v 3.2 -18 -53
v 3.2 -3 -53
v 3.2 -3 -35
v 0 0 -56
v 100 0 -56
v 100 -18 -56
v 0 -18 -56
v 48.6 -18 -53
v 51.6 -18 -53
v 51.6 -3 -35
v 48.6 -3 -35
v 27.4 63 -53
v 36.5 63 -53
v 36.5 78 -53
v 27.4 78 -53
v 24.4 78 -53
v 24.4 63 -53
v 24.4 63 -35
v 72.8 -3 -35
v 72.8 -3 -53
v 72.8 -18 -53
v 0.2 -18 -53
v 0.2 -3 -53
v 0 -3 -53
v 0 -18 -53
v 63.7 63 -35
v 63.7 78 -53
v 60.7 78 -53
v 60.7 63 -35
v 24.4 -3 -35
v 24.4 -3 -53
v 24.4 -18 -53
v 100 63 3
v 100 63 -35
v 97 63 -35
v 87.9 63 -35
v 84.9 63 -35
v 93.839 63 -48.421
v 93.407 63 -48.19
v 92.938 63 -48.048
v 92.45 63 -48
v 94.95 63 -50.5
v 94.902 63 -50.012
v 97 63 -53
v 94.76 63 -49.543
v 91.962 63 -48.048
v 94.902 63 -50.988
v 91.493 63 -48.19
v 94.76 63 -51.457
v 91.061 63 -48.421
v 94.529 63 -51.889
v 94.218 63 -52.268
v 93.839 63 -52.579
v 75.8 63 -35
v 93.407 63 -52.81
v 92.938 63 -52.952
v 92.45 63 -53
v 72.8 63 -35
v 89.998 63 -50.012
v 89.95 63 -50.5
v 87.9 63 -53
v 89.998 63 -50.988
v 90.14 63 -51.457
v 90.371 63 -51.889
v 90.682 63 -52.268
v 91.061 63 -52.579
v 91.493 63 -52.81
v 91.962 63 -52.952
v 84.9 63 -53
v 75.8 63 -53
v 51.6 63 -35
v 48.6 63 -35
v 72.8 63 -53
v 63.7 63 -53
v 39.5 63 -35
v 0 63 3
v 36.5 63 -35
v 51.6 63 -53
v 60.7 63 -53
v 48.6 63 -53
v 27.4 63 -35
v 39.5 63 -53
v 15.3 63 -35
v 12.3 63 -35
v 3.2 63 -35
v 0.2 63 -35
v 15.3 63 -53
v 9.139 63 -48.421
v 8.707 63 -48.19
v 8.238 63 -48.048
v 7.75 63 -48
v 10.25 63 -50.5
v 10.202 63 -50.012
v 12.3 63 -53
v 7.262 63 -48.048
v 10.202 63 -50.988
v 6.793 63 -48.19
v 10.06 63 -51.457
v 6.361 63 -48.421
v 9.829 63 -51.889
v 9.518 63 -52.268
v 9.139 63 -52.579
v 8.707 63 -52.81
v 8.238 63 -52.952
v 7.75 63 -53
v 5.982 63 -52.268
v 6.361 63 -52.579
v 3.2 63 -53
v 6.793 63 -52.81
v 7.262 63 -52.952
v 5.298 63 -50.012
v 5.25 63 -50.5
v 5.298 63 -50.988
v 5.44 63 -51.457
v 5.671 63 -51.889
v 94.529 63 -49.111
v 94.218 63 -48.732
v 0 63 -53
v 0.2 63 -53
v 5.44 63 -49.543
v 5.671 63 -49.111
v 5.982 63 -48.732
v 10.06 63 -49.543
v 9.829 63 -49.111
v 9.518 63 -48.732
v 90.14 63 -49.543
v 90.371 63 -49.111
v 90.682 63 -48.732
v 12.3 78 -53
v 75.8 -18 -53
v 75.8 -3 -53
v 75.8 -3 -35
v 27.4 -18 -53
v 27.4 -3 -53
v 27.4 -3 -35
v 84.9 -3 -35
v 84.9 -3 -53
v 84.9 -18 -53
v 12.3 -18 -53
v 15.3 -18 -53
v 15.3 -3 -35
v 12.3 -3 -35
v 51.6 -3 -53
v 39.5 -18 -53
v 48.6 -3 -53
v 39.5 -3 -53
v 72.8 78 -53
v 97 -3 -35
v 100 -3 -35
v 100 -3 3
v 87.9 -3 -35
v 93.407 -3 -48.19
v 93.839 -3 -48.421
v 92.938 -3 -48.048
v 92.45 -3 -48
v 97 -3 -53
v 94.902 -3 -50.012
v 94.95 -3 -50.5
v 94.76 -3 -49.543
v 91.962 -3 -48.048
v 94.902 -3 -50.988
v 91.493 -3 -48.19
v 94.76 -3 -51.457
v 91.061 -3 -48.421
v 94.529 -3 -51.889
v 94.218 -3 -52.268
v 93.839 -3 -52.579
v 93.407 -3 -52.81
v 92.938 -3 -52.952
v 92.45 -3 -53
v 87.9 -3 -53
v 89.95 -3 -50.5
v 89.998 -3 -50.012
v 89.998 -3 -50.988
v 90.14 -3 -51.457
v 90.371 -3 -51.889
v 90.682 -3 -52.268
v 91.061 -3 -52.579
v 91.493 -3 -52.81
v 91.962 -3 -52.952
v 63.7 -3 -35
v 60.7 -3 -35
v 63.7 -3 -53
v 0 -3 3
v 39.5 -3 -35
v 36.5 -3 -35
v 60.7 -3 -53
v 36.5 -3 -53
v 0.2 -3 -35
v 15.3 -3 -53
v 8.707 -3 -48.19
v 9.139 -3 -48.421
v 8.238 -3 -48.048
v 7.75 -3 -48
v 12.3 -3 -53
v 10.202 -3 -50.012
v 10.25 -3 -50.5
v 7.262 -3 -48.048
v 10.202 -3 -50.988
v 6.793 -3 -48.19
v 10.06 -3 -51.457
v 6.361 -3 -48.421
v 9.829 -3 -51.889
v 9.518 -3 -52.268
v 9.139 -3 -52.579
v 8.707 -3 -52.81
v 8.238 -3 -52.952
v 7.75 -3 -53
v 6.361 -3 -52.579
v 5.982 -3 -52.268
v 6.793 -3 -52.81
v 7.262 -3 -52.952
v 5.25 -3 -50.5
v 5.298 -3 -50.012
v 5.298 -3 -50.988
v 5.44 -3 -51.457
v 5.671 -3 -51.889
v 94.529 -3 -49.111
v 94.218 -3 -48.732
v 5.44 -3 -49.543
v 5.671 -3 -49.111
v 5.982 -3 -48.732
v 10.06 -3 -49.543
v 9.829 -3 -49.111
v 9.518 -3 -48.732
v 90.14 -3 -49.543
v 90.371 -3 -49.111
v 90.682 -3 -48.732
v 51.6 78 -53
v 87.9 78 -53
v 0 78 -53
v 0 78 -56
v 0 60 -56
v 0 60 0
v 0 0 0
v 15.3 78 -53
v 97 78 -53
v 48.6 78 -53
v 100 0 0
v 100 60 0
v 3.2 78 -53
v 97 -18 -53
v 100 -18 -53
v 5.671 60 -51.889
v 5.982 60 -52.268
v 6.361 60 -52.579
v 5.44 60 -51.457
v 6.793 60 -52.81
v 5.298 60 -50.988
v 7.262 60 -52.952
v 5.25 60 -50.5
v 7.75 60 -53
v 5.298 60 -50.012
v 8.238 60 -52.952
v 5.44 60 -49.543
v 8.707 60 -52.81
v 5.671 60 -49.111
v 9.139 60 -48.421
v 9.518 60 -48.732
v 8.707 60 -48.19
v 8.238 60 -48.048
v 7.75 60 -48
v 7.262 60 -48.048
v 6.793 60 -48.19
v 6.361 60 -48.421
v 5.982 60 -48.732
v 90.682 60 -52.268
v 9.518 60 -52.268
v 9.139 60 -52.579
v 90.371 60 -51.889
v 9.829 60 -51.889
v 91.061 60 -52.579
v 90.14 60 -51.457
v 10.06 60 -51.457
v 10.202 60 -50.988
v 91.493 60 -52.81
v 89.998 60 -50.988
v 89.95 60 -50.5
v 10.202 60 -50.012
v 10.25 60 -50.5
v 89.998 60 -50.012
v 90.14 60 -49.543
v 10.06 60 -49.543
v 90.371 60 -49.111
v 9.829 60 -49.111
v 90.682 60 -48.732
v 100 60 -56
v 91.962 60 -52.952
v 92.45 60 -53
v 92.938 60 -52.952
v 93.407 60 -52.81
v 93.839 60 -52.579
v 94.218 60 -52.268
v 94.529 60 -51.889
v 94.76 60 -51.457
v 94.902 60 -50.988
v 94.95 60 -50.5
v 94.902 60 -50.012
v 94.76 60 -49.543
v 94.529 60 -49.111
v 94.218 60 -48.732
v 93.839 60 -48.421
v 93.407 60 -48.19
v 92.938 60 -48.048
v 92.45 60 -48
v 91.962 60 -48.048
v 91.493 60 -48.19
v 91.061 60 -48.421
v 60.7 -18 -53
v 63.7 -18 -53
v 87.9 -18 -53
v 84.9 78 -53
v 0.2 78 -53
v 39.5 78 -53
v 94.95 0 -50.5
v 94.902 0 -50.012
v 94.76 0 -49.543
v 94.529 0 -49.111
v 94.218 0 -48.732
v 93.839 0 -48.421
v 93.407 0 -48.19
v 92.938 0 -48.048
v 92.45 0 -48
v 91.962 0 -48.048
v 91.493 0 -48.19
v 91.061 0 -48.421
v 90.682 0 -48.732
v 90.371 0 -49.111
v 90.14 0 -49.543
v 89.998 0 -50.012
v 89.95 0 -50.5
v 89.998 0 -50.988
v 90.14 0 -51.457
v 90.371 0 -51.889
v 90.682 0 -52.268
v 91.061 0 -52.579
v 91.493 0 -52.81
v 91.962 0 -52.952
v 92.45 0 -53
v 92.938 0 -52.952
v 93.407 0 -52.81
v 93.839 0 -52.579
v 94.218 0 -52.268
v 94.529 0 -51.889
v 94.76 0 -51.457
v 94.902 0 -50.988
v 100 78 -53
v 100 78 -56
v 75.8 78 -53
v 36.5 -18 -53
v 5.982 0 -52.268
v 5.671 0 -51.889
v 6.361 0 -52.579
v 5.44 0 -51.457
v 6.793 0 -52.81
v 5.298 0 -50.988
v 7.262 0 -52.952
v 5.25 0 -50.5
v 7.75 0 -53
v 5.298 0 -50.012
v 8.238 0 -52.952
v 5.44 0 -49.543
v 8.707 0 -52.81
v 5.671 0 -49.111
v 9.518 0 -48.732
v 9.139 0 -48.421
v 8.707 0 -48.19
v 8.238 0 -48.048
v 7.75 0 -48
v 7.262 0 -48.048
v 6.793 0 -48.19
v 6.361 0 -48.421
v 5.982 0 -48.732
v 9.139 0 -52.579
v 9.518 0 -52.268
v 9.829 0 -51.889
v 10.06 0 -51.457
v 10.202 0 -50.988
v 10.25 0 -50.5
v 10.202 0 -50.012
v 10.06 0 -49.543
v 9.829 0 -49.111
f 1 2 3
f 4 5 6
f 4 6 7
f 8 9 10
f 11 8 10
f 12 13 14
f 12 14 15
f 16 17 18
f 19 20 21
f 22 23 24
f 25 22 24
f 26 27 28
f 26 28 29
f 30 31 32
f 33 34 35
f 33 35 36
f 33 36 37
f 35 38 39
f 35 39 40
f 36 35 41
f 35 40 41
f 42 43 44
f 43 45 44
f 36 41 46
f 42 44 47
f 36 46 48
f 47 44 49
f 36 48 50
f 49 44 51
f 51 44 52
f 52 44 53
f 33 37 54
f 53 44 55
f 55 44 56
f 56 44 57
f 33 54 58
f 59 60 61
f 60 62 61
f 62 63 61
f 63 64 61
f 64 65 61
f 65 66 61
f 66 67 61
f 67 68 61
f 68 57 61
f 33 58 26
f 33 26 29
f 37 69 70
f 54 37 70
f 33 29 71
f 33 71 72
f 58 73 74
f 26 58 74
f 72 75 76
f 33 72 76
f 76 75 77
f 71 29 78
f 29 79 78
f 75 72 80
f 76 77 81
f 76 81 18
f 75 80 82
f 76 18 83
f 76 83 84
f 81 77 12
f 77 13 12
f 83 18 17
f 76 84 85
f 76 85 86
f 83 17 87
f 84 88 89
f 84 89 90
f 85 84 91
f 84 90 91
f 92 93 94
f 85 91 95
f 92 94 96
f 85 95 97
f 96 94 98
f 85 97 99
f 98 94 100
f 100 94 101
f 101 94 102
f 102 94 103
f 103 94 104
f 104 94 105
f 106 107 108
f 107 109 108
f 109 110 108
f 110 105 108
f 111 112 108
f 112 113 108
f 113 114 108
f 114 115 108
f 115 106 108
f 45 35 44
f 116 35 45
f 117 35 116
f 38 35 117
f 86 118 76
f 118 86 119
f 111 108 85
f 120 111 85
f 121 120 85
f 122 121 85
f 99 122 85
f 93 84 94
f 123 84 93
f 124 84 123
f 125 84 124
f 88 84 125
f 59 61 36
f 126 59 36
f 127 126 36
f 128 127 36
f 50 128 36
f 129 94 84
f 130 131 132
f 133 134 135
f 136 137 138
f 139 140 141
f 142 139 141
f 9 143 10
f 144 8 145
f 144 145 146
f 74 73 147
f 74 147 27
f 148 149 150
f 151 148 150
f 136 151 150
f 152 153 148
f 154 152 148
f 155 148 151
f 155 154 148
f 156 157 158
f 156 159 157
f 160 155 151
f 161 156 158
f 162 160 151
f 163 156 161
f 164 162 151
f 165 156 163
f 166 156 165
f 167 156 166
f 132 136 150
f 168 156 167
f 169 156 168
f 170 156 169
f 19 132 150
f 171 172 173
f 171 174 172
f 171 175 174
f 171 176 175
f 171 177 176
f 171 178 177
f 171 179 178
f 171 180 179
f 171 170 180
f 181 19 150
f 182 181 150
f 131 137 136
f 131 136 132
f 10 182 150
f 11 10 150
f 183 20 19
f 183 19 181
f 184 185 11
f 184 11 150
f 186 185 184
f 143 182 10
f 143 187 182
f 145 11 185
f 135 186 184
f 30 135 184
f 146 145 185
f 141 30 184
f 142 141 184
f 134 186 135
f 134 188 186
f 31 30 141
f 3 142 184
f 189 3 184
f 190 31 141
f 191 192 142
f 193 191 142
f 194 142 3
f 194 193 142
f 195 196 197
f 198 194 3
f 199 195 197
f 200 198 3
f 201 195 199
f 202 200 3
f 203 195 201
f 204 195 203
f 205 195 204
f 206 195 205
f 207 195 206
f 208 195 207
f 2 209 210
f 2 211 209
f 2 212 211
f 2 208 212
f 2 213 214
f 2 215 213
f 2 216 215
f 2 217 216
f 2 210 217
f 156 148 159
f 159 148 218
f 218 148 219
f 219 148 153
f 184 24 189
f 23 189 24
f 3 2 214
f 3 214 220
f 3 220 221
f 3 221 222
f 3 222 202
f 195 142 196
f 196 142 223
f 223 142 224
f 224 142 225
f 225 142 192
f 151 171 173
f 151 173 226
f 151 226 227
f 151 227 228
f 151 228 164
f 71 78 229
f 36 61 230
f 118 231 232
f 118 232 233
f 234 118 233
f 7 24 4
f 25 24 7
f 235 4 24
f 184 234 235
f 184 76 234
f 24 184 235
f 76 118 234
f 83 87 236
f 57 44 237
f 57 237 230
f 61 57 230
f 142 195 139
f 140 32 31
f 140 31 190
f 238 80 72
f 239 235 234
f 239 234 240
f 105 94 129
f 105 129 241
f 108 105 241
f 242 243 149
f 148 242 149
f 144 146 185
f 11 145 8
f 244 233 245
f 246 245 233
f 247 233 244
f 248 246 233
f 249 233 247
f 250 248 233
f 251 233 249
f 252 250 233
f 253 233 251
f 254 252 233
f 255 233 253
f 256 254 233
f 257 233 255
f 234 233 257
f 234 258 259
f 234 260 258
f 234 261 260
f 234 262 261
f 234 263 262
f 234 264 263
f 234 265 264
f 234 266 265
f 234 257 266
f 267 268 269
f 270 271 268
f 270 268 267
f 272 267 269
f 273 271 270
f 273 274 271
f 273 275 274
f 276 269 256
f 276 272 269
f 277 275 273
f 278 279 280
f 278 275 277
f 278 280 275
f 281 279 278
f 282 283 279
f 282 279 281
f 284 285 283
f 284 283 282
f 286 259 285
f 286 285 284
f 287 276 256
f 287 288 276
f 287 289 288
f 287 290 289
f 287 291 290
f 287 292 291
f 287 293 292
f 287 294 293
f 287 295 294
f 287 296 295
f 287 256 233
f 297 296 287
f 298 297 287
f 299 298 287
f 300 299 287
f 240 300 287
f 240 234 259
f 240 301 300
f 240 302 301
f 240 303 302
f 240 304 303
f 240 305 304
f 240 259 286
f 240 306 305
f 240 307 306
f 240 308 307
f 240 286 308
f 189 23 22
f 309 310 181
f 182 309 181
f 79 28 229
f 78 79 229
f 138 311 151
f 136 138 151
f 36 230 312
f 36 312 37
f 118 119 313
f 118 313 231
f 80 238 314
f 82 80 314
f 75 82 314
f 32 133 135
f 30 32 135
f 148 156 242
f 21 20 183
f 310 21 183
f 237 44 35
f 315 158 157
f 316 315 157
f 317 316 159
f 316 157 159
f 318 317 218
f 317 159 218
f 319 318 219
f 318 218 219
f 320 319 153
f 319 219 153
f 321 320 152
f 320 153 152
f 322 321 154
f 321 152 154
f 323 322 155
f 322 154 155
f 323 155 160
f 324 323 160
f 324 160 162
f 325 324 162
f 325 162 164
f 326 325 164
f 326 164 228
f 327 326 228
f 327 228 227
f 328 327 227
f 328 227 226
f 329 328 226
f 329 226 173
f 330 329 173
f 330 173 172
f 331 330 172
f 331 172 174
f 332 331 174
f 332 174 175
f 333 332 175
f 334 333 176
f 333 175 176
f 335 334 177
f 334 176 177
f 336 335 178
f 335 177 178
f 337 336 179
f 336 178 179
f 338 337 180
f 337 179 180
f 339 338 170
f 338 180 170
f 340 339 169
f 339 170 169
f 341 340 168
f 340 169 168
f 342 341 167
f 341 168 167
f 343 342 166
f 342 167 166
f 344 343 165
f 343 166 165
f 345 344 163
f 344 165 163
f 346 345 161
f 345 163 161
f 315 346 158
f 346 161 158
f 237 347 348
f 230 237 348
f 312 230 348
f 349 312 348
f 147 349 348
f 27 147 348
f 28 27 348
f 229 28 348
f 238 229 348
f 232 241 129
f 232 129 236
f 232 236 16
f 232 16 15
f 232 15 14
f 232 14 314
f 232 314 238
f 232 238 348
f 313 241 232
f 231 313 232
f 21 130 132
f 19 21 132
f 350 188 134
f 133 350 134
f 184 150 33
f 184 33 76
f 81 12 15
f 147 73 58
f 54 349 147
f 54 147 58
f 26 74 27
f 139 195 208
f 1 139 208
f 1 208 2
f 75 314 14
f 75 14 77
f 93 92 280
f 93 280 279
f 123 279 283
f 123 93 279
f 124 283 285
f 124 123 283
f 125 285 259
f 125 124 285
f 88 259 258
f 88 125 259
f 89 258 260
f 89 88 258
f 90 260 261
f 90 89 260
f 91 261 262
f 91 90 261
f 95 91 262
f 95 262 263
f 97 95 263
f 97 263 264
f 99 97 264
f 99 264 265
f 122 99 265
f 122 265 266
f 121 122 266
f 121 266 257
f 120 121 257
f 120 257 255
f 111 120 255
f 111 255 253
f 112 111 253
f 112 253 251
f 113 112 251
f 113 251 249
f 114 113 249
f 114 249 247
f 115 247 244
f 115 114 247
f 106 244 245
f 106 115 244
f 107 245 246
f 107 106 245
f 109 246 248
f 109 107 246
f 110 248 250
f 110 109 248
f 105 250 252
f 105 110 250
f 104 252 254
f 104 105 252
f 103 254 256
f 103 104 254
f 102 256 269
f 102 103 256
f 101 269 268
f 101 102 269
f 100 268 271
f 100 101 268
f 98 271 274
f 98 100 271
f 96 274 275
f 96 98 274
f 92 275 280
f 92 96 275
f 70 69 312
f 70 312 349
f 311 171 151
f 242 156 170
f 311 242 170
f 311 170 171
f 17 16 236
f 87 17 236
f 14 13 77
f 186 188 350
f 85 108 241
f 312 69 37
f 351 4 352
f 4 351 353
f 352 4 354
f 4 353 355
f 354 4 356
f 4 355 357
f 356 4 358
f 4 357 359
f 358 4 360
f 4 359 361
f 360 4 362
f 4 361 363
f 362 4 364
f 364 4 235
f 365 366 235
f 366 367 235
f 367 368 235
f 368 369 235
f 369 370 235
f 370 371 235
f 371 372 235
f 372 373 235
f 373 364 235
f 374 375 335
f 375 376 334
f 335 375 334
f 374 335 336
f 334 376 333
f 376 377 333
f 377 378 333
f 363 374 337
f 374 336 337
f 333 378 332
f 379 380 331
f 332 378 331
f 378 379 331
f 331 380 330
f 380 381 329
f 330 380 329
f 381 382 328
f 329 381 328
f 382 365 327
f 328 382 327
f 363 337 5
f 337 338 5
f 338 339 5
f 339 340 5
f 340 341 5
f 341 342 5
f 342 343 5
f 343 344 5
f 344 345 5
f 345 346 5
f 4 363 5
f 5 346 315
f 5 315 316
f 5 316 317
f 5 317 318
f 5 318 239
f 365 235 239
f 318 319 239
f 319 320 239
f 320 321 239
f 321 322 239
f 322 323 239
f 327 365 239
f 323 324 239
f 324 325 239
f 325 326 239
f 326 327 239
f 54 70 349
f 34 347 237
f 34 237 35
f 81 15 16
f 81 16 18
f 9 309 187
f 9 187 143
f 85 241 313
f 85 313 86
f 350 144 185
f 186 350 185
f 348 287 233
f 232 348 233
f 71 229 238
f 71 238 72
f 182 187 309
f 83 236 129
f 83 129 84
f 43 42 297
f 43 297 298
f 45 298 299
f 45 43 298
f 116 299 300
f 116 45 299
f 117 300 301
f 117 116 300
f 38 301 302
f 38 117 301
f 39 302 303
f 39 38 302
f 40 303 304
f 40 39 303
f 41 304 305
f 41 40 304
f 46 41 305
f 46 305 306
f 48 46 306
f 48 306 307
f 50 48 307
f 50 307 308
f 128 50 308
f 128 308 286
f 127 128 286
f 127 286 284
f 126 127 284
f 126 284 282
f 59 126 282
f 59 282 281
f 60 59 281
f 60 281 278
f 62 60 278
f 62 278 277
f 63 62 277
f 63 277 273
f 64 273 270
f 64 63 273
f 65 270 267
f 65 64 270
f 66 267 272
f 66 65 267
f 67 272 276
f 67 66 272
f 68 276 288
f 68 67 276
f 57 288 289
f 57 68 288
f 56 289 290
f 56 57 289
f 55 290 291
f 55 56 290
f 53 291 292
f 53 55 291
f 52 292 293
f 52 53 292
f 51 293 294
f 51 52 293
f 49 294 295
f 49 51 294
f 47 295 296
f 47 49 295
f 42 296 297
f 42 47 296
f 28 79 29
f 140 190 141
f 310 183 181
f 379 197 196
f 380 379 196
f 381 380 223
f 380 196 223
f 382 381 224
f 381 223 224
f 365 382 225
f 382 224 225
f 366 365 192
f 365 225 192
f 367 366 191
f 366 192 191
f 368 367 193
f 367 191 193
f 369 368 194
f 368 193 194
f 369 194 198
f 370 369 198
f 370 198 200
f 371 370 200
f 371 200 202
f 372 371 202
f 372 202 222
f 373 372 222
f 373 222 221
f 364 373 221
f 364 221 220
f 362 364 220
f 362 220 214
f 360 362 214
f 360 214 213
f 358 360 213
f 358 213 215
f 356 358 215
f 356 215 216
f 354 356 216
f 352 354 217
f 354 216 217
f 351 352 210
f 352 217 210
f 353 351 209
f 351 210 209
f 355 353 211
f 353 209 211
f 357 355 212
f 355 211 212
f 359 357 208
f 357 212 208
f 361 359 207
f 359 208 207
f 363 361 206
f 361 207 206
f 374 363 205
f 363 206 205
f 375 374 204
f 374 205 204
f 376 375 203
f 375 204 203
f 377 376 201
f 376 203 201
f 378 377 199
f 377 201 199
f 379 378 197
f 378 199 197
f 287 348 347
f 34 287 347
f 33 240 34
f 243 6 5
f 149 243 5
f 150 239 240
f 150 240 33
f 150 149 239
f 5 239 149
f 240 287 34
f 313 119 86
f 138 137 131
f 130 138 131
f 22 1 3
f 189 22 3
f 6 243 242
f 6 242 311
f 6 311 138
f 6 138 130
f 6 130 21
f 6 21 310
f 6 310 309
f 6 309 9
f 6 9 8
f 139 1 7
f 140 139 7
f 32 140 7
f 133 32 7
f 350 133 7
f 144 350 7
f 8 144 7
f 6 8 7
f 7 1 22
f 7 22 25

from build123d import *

# Parameters (mm, degrees)
SKETCH1_W                = 100
SKETCH1_H                = 60
BOSS_EXTRUDE1_DEPTH      = 3
SKETCH2_W                = 100
SKETCH2_H                = 3
BOSS_EXTRUDE2_DEPTH      = 53
BOSS_EXTRUDE2_DEPTH_BACK = 3
SKETCH3_W                = 100
SKETCH3_H                = 18
BOSS_EXTRUDE3_DEPTH      = 3
BOSS_EXTRUDE4_DEPTH      = 3
SKETCH6_W                = 97
SKETCH6_H                = 18
BOSS_EXTRUDE5_DEPTH      = 3
LPATTERN4_COUNT          = 9
LPATTERN4_PITCH          = 12.1
SKETCH7_R                = 2.5
CUT_EXTRUDE2_DEPTH       = 82
CUT_EXTRUDE4_DEPTH       = 101


with BuildPart() as part:
    # Sketch1 → Boss-Extrude1 (new body)
    with BuildSketch(Plane.XY):
        with Locations((50, 30)):
            Rectangle(SKETCH1_W, SKETCH1_H)
    extrude(amount=BOSS_EXTRUDE1_DEPTH)

    # Sketch2 → Boss-Extrude2 (add, two sides)
    with BuildSketch(Plane(origin=(0, 0, 0), x_dir=(-1, 0, 0), z_dir=(0, 0, -1))) as boss_extrude2_sk:
        with Locations((-50, 61.5)):
            Rectangle(SKETCH2_W, SKETCH2_H)
        with Locations((-50, -1.5)):
            Rectangle(SKETCH2_W, SKETCH2_H)
    extrude(amount=BOSS_EXTRUDE2_DEPTH)
    extrude(boss_extrude2_sk.sketch, amount=-BOSS_EXTRUDE2_DEPTH_BACK)

    # Sketch3 → Boss-Extrude3 (add)
    with BuildSketch(Plane(origin=(0, 0, -53), x_dir=(-1, 0, 0), z_dir=(0, 0, -1))):
        with Locations((-50, 69)):
            Rectangle(SKETCH3_W, SKETCH3_H)
        with Locations((-50, -9)):
            Rectangle(SKETCH3_W, SKETCH3_H)
    extrude(amount=BOSS_EXTRUDE3_DEPTH)

    # Sketch5 → Boss-Extrude4 (add)
    with BuildSketch(Plane(origin=(100, 0, 0), x_dir=(0, 0, -1), z_dir=(1, 0, 0))):
        Polygon((35, -3), (53, -3), (53, -18), align=None)
    boss_extrude4 = extrude(amount=-BOSS_EXTRUDE4_DEPTH)

    # Sketch6 → Boss-Extrude5 (add)
    with BuildSketch(Plane.XZ.offset(3)):
        with Locations((48.5, -44)):
            Rectangle(SKETCH6_W, SKETCH6_H)
    extrude(amount=-BOSS_EXTRUDE5_DEPTH)

    # LPattern4: Boss-Extrude4 ×9
    with Locations(*[(-i * LPATTERN4_PITCH, 0, 0) for i in range(1, LPATTERN4_COUNT)]):
        add(boss_extrude4)

    # Sketch7 → Cut-Extrude2 (cut, through all)
    with BuildSketch(Plane.XZ.offset(3)):
        with Locations((92.45, -50.5)):
            Circle(SKETCH7_R)
        with Locations((7.75, -50.5)):
            Circle(SKETCH7_R)
    extrude(amount=-CUT_EXTRUDE2_DEPTH, mode=Mode.SUBTRACT)

    # Sketch10 → Cut-Extrude4 (cut, through all)
    with BuildSketch(Plane.ZY):
        Polygon((0, 30), (3, 30), (3, 114.137691369), (-76.856579816, 109.737899985), (-70.799886201, 33.223019627), align=None)
    extrude(amount=-CUT_EXTRUDE4_DEPTH, mode=Mode.SUBTRACT)

    # Mirror2: part across plane


with BuildPart() as part_1:
    add(part.part)
    add(part.part.mirror(Plane(origin=(100, 30, 0), x_dir=(0, 0, 1), z_dir=(0, -1, 0))))


solid = part_1.part
